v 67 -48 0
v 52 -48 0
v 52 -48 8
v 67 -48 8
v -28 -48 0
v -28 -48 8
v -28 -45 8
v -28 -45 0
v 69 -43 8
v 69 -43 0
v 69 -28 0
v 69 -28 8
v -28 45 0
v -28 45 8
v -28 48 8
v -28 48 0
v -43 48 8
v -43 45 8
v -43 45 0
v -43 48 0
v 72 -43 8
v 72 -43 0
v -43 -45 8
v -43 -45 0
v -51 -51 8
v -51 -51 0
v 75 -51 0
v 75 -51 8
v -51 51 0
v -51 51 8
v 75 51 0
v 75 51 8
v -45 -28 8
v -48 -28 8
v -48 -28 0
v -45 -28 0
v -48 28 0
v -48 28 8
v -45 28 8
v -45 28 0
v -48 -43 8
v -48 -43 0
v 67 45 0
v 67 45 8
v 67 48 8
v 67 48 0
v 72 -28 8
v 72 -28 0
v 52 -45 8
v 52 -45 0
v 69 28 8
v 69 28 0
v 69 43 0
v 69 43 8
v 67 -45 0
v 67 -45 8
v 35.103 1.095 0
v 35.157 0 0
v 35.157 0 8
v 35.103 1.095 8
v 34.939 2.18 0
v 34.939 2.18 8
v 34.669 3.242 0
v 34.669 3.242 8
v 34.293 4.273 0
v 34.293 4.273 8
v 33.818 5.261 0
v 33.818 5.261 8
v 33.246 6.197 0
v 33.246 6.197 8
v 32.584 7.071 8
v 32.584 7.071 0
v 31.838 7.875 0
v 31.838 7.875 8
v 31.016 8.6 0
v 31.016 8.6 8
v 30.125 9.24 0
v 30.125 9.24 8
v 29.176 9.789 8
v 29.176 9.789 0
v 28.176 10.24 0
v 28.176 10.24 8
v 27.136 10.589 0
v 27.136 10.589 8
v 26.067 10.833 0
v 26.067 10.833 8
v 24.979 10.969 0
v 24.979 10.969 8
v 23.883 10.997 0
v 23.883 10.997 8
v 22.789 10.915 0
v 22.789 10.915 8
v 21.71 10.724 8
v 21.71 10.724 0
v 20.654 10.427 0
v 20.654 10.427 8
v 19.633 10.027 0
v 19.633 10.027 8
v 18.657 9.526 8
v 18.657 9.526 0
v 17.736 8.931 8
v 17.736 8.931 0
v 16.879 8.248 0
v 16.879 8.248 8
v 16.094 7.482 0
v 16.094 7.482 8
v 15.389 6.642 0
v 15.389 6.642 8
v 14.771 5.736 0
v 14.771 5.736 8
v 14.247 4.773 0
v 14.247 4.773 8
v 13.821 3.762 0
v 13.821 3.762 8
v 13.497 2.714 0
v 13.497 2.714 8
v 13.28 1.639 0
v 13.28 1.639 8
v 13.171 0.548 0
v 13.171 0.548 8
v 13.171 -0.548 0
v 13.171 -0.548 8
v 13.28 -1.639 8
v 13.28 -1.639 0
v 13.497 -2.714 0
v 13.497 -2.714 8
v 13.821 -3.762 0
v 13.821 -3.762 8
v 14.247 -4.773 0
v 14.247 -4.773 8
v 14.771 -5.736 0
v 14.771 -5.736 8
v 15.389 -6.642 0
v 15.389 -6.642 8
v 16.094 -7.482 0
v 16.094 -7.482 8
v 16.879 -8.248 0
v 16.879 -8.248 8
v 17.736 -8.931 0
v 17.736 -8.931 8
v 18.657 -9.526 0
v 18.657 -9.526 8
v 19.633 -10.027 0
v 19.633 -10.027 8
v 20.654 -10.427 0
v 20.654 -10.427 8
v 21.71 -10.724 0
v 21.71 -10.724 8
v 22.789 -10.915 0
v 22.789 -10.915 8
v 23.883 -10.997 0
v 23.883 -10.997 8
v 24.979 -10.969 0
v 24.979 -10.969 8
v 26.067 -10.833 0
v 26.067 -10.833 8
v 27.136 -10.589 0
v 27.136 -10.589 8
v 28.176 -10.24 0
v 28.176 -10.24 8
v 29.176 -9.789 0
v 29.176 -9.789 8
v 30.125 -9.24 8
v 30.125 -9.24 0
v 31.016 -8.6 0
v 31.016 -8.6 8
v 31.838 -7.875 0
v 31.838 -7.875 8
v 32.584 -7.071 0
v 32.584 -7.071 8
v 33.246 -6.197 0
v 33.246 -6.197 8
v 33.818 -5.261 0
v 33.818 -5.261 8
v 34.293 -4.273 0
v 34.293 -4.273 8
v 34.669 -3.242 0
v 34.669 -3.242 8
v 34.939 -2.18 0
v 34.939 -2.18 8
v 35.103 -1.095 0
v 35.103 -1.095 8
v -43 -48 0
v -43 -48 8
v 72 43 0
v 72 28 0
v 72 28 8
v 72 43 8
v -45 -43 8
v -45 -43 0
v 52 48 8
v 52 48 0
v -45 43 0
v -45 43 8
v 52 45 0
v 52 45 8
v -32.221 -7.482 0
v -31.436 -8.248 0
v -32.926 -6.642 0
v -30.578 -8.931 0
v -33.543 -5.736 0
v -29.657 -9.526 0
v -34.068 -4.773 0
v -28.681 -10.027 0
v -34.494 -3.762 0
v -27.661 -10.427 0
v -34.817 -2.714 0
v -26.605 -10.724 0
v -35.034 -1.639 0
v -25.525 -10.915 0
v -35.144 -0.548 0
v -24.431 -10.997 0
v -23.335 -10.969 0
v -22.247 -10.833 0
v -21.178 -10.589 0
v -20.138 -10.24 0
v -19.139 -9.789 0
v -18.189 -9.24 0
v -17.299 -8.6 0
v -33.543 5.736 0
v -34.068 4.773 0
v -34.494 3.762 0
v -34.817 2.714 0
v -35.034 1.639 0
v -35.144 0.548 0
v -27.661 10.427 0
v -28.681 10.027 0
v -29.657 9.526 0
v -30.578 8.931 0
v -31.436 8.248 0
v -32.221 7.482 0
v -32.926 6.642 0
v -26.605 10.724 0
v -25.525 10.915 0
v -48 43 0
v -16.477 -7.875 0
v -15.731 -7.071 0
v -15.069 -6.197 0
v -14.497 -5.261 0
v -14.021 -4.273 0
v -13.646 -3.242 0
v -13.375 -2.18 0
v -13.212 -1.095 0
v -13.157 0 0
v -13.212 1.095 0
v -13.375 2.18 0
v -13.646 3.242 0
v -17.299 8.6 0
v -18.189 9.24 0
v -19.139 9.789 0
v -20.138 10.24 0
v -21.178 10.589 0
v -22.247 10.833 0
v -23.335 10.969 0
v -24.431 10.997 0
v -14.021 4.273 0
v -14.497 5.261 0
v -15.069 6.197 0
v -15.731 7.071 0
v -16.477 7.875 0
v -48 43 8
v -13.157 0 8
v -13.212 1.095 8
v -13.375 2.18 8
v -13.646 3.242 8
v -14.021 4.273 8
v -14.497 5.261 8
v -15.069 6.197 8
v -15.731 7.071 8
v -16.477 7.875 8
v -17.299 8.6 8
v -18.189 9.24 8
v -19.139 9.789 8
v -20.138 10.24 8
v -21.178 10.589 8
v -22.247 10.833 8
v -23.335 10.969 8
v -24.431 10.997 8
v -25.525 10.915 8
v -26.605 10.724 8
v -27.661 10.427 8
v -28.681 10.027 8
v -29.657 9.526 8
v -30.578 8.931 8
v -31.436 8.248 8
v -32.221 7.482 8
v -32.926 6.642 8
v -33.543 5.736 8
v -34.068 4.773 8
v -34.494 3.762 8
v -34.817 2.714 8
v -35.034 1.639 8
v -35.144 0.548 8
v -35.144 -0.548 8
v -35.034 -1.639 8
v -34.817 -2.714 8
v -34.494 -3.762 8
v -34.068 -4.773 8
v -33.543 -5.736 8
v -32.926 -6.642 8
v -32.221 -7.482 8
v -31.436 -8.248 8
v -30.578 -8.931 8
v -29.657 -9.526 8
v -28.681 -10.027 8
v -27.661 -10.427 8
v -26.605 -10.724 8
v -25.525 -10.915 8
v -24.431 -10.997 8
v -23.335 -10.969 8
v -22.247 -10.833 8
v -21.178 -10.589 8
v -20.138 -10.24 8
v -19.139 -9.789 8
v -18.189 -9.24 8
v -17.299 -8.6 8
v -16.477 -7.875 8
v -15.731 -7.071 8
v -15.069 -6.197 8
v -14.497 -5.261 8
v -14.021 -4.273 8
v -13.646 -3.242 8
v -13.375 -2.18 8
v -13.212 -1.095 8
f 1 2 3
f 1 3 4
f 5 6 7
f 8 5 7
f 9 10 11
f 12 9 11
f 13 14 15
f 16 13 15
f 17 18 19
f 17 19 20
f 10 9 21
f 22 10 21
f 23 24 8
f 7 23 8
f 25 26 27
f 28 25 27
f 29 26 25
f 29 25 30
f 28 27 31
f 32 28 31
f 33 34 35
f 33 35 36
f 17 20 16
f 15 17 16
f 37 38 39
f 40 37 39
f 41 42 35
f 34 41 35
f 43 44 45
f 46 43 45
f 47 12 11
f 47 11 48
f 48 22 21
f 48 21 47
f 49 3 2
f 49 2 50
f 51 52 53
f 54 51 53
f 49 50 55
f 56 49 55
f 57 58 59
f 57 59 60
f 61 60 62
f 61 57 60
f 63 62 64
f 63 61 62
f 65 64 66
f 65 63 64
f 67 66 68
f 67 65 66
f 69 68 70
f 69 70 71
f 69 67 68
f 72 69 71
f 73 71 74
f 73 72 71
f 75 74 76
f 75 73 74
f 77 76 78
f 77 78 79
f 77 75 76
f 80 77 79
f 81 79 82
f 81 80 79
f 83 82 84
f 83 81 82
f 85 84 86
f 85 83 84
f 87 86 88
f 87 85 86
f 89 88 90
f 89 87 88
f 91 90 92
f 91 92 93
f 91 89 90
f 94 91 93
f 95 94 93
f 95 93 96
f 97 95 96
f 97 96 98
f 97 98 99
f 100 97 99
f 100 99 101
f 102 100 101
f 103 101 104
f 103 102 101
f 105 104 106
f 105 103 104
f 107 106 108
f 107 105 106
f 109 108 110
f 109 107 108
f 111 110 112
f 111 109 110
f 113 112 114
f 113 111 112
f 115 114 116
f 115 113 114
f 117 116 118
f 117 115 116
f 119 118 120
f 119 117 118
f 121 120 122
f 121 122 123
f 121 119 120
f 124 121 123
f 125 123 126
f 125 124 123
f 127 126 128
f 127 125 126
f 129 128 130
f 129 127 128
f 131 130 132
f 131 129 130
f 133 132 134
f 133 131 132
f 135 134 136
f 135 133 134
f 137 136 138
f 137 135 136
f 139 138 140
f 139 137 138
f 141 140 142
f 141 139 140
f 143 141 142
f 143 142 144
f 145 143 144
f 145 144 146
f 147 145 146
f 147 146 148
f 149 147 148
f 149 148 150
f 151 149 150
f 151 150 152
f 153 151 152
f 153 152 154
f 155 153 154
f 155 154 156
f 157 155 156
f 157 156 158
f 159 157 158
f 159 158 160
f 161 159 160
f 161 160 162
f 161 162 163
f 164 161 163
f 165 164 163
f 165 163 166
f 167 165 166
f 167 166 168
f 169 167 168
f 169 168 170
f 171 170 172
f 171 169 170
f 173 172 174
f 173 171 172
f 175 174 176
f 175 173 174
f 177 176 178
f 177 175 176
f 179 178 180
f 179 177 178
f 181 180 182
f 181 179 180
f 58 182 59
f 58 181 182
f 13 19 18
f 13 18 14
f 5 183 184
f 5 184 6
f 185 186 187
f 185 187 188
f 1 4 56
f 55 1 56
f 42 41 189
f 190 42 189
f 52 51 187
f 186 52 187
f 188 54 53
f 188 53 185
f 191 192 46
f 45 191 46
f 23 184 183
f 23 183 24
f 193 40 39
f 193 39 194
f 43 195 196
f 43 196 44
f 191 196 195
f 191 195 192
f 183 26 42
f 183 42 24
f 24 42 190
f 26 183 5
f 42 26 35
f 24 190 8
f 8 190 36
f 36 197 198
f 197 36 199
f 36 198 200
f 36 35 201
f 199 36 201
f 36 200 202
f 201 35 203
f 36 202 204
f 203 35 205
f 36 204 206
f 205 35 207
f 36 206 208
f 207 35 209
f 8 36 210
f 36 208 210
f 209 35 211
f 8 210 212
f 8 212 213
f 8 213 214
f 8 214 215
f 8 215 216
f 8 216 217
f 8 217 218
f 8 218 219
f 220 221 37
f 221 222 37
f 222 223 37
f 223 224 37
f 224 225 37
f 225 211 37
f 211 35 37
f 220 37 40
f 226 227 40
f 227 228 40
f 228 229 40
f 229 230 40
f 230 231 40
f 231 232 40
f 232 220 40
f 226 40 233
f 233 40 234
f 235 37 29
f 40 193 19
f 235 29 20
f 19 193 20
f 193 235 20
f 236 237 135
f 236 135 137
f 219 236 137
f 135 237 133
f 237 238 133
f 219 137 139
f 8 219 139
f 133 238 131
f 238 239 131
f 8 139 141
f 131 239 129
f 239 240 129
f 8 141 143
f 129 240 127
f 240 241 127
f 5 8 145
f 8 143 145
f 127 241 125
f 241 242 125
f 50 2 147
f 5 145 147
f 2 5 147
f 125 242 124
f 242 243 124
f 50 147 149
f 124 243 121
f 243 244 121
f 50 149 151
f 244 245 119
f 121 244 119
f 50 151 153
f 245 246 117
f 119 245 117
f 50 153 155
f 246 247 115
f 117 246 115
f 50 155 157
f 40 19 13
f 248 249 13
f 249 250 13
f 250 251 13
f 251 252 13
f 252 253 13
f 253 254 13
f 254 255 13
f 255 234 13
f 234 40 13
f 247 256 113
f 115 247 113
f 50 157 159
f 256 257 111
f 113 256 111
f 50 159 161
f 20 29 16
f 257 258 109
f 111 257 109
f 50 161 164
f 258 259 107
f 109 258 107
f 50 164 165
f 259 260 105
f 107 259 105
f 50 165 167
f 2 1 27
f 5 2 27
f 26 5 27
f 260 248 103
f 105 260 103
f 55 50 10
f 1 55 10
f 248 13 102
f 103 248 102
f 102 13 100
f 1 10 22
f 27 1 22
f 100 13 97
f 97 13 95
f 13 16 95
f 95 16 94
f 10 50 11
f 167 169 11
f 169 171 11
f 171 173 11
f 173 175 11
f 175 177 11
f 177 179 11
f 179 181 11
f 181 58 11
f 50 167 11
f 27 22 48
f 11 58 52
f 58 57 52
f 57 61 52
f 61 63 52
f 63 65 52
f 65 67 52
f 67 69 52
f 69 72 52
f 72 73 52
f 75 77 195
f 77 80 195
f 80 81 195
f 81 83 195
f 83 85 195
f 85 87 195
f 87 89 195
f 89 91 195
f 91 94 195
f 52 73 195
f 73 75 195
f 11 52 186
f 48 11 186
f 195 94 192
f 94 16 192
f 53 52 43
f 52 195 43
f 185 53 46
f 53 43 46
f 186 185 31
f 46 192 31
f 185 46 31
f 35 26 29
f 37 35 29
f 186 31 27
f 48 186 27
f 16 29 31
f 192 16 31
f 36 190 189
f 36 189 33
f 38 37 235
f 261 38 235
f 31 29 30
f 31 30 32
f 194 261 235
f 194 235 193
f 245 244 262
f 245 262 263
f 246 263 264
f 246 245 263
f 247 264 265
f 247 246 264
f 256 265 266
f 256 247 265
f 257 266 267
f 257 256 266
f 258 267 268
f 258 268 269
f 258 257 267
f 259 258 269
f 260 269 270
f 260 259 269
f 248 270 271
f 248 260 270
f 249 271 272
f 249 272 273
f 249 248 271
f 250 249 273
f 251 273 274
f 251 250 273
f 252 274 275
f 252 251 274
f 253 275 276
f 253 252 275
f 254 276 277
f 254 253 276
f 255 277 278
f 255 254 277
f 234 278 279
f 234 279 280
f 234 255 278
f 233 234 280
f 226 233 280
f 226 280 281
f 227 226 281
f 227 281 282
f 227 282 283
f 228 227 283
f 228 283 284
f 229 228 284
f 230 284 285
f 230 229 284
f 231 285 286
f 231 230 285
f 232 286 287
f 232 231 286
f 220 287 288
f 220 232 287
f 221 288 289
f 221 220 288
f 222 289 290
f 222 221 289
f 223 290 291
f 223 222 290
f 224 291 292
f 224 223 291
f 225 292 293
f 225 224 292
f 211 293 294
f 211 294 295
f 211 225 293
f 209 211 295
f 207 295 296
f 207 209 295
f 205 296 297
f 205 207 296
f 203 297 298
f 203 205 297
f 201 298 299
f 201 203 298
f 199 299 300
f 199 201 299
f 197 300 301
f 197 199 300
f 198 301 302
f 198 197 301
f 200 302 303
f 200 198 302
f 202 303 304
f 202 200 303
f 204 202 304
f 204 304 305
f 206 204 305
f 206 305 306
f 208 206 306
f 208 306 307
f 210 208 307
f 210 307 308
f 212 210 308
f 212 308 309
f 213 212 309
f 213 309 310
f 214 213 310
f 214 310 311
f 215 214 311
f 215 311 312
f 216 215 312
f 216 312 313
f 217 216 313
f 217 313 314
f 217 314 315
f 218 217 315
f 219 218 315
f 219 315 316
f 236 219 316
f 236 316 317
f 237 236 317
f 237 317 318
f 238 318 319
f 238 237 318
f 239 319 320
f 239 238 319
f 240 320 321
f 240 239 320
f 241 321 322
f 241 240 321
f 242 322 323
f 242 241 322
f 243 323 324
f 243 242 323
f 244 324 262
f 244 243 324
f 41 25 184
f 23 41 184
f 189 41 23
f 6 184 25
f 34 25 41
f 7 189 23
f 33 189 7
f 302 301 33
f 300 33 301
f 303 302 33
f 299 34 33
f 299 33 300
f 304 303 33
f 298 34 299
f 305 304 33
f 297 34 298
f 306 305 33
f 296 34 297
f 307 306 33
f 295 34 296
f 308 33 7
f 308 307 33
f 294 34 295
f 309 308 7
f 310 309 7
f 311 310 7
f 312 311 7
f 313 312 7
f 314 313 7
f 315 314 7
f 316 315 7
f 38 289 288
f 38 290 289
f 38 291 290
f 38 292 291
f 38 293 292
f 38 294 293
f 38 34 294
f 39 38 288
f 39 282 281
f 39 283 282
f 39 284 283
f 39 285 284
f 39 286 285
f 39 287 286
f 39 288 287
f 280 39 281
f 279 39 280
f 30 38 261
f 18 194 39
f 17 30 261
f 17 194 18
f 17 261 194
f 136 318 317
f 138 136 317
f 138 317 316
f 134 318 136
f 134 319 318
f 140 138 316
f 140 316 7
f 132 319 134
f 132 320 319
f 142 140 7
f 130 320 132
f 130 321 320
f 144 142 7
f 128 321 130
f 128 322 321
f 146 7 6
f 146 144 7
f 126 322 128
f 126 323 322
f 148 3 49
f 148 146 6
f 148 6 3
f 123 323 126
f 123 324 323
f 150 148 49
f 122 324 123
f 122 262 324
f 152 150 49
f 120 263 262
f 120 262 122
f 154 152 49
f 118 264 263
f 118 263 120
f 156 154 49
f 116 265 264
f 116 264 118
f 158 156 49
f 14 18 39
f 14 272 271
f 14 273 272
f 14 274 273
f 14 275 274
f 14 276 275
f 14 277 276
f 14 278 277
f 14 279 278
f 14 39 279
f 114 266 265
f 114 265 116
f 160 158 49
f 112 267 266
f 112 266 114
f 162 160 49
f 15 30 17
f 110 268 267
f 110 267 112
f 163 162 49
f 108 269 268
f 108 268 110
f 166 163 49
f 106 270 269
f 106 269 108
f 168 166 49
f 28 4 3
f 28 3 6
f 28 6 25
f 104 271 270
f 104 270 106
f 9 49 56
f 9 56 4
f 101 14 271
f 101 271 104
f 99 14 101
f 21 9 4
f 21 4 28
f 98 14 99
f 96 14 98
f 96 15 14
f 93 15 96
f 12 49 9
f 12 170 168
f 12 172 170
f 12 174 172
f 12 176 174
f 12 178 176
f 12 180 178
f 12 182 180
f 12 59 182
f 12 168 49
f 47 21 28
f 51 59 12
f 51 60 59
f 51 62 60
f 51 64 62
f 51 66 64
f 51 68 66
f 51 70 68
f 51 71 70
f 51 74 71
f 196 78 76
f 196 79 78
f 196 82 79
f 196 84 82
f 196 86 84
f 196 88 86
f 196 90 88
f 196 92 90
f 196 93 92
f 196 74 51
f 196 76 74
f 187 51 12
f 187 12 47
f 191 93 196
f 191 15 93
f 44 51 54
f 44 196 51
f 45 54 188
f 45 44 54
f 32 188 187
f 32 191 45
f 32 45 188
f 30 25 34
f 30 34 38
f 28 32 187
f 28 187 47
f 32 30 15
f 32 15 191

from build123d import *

# Parameters (mm, degrees)
SKETCH1_W           = 126
SKETCH1_H           = 102
SKETCH1_R           = 11
SKETCH1_W_2         = 3
SKETCH1_H_2         = 15
SKETCH1_W_3         = 15
SKETCH1_H_3         = 3
BOSS_EXTRUDE1_DEPTH = 8


with BuildPart() as part:
    # Sketch1 → Boss-Extrude1 (new body)
    with BuildSketch(Plane.XY):
        with Locations((12, 0)):
            Rectangle(SKETCH1_W, SKETCH1_H)
        with Locations((-24.15725, 0)):
            Circle(SKETCH1_R, mode=Mode.SUBTRACT)
        with Locations((24.15725, 0)):
            Circle(SKETCH1_R, mode=Mode.SUBTRACT)
        with Locations((-46.5, -35.5)):
            Rectangle(SKETCH1_W_2, SKETCH1_H_2, mode=Mode.SUBTRACT)
        with Locations((-46.5, 35.5)):
            Rectangle(SKETCH1_W_2, SKETCH1_H_2, mode=Mode.SUBTRACT)
        with Locations((70.5, 35.5)):
            Rectangle(SKETCH1_W_2, SKETCH1_H_2, mode=Mode.SUBTRACT)
        with Locations((70.5, -35.5)):
            Rectangle(SKETCH1_W_2, SKETCH1_H_2, mode=Mode.SUBTRACT)
        with Locations((-35.5, 46.5)):
            Rectangle(SKETCH1_W_3, SKETCH1_H_3, mode=Mode.SUBTRACT)
        with Locations((59.5, 46.5)):
            Rectangle(SKETCH1_W_3, SKETCH1_H_3, mode=Mode.SUBTRACT)
        with Locations((-35.5, -46.5)):
            Rectangle(SKETCH1_W_3, SKETCH1_H_3, mode=Mode.SUBTRACT)
        with Locations((59.5, -46.5)):
            Rectangle(SKETCH1_W_3, SKETCH1_H_3, mode=Mode.SUBTRACT)
    extrude(amount=BOSS_EXTRUDE1_DEPTH)


solid = part.part
